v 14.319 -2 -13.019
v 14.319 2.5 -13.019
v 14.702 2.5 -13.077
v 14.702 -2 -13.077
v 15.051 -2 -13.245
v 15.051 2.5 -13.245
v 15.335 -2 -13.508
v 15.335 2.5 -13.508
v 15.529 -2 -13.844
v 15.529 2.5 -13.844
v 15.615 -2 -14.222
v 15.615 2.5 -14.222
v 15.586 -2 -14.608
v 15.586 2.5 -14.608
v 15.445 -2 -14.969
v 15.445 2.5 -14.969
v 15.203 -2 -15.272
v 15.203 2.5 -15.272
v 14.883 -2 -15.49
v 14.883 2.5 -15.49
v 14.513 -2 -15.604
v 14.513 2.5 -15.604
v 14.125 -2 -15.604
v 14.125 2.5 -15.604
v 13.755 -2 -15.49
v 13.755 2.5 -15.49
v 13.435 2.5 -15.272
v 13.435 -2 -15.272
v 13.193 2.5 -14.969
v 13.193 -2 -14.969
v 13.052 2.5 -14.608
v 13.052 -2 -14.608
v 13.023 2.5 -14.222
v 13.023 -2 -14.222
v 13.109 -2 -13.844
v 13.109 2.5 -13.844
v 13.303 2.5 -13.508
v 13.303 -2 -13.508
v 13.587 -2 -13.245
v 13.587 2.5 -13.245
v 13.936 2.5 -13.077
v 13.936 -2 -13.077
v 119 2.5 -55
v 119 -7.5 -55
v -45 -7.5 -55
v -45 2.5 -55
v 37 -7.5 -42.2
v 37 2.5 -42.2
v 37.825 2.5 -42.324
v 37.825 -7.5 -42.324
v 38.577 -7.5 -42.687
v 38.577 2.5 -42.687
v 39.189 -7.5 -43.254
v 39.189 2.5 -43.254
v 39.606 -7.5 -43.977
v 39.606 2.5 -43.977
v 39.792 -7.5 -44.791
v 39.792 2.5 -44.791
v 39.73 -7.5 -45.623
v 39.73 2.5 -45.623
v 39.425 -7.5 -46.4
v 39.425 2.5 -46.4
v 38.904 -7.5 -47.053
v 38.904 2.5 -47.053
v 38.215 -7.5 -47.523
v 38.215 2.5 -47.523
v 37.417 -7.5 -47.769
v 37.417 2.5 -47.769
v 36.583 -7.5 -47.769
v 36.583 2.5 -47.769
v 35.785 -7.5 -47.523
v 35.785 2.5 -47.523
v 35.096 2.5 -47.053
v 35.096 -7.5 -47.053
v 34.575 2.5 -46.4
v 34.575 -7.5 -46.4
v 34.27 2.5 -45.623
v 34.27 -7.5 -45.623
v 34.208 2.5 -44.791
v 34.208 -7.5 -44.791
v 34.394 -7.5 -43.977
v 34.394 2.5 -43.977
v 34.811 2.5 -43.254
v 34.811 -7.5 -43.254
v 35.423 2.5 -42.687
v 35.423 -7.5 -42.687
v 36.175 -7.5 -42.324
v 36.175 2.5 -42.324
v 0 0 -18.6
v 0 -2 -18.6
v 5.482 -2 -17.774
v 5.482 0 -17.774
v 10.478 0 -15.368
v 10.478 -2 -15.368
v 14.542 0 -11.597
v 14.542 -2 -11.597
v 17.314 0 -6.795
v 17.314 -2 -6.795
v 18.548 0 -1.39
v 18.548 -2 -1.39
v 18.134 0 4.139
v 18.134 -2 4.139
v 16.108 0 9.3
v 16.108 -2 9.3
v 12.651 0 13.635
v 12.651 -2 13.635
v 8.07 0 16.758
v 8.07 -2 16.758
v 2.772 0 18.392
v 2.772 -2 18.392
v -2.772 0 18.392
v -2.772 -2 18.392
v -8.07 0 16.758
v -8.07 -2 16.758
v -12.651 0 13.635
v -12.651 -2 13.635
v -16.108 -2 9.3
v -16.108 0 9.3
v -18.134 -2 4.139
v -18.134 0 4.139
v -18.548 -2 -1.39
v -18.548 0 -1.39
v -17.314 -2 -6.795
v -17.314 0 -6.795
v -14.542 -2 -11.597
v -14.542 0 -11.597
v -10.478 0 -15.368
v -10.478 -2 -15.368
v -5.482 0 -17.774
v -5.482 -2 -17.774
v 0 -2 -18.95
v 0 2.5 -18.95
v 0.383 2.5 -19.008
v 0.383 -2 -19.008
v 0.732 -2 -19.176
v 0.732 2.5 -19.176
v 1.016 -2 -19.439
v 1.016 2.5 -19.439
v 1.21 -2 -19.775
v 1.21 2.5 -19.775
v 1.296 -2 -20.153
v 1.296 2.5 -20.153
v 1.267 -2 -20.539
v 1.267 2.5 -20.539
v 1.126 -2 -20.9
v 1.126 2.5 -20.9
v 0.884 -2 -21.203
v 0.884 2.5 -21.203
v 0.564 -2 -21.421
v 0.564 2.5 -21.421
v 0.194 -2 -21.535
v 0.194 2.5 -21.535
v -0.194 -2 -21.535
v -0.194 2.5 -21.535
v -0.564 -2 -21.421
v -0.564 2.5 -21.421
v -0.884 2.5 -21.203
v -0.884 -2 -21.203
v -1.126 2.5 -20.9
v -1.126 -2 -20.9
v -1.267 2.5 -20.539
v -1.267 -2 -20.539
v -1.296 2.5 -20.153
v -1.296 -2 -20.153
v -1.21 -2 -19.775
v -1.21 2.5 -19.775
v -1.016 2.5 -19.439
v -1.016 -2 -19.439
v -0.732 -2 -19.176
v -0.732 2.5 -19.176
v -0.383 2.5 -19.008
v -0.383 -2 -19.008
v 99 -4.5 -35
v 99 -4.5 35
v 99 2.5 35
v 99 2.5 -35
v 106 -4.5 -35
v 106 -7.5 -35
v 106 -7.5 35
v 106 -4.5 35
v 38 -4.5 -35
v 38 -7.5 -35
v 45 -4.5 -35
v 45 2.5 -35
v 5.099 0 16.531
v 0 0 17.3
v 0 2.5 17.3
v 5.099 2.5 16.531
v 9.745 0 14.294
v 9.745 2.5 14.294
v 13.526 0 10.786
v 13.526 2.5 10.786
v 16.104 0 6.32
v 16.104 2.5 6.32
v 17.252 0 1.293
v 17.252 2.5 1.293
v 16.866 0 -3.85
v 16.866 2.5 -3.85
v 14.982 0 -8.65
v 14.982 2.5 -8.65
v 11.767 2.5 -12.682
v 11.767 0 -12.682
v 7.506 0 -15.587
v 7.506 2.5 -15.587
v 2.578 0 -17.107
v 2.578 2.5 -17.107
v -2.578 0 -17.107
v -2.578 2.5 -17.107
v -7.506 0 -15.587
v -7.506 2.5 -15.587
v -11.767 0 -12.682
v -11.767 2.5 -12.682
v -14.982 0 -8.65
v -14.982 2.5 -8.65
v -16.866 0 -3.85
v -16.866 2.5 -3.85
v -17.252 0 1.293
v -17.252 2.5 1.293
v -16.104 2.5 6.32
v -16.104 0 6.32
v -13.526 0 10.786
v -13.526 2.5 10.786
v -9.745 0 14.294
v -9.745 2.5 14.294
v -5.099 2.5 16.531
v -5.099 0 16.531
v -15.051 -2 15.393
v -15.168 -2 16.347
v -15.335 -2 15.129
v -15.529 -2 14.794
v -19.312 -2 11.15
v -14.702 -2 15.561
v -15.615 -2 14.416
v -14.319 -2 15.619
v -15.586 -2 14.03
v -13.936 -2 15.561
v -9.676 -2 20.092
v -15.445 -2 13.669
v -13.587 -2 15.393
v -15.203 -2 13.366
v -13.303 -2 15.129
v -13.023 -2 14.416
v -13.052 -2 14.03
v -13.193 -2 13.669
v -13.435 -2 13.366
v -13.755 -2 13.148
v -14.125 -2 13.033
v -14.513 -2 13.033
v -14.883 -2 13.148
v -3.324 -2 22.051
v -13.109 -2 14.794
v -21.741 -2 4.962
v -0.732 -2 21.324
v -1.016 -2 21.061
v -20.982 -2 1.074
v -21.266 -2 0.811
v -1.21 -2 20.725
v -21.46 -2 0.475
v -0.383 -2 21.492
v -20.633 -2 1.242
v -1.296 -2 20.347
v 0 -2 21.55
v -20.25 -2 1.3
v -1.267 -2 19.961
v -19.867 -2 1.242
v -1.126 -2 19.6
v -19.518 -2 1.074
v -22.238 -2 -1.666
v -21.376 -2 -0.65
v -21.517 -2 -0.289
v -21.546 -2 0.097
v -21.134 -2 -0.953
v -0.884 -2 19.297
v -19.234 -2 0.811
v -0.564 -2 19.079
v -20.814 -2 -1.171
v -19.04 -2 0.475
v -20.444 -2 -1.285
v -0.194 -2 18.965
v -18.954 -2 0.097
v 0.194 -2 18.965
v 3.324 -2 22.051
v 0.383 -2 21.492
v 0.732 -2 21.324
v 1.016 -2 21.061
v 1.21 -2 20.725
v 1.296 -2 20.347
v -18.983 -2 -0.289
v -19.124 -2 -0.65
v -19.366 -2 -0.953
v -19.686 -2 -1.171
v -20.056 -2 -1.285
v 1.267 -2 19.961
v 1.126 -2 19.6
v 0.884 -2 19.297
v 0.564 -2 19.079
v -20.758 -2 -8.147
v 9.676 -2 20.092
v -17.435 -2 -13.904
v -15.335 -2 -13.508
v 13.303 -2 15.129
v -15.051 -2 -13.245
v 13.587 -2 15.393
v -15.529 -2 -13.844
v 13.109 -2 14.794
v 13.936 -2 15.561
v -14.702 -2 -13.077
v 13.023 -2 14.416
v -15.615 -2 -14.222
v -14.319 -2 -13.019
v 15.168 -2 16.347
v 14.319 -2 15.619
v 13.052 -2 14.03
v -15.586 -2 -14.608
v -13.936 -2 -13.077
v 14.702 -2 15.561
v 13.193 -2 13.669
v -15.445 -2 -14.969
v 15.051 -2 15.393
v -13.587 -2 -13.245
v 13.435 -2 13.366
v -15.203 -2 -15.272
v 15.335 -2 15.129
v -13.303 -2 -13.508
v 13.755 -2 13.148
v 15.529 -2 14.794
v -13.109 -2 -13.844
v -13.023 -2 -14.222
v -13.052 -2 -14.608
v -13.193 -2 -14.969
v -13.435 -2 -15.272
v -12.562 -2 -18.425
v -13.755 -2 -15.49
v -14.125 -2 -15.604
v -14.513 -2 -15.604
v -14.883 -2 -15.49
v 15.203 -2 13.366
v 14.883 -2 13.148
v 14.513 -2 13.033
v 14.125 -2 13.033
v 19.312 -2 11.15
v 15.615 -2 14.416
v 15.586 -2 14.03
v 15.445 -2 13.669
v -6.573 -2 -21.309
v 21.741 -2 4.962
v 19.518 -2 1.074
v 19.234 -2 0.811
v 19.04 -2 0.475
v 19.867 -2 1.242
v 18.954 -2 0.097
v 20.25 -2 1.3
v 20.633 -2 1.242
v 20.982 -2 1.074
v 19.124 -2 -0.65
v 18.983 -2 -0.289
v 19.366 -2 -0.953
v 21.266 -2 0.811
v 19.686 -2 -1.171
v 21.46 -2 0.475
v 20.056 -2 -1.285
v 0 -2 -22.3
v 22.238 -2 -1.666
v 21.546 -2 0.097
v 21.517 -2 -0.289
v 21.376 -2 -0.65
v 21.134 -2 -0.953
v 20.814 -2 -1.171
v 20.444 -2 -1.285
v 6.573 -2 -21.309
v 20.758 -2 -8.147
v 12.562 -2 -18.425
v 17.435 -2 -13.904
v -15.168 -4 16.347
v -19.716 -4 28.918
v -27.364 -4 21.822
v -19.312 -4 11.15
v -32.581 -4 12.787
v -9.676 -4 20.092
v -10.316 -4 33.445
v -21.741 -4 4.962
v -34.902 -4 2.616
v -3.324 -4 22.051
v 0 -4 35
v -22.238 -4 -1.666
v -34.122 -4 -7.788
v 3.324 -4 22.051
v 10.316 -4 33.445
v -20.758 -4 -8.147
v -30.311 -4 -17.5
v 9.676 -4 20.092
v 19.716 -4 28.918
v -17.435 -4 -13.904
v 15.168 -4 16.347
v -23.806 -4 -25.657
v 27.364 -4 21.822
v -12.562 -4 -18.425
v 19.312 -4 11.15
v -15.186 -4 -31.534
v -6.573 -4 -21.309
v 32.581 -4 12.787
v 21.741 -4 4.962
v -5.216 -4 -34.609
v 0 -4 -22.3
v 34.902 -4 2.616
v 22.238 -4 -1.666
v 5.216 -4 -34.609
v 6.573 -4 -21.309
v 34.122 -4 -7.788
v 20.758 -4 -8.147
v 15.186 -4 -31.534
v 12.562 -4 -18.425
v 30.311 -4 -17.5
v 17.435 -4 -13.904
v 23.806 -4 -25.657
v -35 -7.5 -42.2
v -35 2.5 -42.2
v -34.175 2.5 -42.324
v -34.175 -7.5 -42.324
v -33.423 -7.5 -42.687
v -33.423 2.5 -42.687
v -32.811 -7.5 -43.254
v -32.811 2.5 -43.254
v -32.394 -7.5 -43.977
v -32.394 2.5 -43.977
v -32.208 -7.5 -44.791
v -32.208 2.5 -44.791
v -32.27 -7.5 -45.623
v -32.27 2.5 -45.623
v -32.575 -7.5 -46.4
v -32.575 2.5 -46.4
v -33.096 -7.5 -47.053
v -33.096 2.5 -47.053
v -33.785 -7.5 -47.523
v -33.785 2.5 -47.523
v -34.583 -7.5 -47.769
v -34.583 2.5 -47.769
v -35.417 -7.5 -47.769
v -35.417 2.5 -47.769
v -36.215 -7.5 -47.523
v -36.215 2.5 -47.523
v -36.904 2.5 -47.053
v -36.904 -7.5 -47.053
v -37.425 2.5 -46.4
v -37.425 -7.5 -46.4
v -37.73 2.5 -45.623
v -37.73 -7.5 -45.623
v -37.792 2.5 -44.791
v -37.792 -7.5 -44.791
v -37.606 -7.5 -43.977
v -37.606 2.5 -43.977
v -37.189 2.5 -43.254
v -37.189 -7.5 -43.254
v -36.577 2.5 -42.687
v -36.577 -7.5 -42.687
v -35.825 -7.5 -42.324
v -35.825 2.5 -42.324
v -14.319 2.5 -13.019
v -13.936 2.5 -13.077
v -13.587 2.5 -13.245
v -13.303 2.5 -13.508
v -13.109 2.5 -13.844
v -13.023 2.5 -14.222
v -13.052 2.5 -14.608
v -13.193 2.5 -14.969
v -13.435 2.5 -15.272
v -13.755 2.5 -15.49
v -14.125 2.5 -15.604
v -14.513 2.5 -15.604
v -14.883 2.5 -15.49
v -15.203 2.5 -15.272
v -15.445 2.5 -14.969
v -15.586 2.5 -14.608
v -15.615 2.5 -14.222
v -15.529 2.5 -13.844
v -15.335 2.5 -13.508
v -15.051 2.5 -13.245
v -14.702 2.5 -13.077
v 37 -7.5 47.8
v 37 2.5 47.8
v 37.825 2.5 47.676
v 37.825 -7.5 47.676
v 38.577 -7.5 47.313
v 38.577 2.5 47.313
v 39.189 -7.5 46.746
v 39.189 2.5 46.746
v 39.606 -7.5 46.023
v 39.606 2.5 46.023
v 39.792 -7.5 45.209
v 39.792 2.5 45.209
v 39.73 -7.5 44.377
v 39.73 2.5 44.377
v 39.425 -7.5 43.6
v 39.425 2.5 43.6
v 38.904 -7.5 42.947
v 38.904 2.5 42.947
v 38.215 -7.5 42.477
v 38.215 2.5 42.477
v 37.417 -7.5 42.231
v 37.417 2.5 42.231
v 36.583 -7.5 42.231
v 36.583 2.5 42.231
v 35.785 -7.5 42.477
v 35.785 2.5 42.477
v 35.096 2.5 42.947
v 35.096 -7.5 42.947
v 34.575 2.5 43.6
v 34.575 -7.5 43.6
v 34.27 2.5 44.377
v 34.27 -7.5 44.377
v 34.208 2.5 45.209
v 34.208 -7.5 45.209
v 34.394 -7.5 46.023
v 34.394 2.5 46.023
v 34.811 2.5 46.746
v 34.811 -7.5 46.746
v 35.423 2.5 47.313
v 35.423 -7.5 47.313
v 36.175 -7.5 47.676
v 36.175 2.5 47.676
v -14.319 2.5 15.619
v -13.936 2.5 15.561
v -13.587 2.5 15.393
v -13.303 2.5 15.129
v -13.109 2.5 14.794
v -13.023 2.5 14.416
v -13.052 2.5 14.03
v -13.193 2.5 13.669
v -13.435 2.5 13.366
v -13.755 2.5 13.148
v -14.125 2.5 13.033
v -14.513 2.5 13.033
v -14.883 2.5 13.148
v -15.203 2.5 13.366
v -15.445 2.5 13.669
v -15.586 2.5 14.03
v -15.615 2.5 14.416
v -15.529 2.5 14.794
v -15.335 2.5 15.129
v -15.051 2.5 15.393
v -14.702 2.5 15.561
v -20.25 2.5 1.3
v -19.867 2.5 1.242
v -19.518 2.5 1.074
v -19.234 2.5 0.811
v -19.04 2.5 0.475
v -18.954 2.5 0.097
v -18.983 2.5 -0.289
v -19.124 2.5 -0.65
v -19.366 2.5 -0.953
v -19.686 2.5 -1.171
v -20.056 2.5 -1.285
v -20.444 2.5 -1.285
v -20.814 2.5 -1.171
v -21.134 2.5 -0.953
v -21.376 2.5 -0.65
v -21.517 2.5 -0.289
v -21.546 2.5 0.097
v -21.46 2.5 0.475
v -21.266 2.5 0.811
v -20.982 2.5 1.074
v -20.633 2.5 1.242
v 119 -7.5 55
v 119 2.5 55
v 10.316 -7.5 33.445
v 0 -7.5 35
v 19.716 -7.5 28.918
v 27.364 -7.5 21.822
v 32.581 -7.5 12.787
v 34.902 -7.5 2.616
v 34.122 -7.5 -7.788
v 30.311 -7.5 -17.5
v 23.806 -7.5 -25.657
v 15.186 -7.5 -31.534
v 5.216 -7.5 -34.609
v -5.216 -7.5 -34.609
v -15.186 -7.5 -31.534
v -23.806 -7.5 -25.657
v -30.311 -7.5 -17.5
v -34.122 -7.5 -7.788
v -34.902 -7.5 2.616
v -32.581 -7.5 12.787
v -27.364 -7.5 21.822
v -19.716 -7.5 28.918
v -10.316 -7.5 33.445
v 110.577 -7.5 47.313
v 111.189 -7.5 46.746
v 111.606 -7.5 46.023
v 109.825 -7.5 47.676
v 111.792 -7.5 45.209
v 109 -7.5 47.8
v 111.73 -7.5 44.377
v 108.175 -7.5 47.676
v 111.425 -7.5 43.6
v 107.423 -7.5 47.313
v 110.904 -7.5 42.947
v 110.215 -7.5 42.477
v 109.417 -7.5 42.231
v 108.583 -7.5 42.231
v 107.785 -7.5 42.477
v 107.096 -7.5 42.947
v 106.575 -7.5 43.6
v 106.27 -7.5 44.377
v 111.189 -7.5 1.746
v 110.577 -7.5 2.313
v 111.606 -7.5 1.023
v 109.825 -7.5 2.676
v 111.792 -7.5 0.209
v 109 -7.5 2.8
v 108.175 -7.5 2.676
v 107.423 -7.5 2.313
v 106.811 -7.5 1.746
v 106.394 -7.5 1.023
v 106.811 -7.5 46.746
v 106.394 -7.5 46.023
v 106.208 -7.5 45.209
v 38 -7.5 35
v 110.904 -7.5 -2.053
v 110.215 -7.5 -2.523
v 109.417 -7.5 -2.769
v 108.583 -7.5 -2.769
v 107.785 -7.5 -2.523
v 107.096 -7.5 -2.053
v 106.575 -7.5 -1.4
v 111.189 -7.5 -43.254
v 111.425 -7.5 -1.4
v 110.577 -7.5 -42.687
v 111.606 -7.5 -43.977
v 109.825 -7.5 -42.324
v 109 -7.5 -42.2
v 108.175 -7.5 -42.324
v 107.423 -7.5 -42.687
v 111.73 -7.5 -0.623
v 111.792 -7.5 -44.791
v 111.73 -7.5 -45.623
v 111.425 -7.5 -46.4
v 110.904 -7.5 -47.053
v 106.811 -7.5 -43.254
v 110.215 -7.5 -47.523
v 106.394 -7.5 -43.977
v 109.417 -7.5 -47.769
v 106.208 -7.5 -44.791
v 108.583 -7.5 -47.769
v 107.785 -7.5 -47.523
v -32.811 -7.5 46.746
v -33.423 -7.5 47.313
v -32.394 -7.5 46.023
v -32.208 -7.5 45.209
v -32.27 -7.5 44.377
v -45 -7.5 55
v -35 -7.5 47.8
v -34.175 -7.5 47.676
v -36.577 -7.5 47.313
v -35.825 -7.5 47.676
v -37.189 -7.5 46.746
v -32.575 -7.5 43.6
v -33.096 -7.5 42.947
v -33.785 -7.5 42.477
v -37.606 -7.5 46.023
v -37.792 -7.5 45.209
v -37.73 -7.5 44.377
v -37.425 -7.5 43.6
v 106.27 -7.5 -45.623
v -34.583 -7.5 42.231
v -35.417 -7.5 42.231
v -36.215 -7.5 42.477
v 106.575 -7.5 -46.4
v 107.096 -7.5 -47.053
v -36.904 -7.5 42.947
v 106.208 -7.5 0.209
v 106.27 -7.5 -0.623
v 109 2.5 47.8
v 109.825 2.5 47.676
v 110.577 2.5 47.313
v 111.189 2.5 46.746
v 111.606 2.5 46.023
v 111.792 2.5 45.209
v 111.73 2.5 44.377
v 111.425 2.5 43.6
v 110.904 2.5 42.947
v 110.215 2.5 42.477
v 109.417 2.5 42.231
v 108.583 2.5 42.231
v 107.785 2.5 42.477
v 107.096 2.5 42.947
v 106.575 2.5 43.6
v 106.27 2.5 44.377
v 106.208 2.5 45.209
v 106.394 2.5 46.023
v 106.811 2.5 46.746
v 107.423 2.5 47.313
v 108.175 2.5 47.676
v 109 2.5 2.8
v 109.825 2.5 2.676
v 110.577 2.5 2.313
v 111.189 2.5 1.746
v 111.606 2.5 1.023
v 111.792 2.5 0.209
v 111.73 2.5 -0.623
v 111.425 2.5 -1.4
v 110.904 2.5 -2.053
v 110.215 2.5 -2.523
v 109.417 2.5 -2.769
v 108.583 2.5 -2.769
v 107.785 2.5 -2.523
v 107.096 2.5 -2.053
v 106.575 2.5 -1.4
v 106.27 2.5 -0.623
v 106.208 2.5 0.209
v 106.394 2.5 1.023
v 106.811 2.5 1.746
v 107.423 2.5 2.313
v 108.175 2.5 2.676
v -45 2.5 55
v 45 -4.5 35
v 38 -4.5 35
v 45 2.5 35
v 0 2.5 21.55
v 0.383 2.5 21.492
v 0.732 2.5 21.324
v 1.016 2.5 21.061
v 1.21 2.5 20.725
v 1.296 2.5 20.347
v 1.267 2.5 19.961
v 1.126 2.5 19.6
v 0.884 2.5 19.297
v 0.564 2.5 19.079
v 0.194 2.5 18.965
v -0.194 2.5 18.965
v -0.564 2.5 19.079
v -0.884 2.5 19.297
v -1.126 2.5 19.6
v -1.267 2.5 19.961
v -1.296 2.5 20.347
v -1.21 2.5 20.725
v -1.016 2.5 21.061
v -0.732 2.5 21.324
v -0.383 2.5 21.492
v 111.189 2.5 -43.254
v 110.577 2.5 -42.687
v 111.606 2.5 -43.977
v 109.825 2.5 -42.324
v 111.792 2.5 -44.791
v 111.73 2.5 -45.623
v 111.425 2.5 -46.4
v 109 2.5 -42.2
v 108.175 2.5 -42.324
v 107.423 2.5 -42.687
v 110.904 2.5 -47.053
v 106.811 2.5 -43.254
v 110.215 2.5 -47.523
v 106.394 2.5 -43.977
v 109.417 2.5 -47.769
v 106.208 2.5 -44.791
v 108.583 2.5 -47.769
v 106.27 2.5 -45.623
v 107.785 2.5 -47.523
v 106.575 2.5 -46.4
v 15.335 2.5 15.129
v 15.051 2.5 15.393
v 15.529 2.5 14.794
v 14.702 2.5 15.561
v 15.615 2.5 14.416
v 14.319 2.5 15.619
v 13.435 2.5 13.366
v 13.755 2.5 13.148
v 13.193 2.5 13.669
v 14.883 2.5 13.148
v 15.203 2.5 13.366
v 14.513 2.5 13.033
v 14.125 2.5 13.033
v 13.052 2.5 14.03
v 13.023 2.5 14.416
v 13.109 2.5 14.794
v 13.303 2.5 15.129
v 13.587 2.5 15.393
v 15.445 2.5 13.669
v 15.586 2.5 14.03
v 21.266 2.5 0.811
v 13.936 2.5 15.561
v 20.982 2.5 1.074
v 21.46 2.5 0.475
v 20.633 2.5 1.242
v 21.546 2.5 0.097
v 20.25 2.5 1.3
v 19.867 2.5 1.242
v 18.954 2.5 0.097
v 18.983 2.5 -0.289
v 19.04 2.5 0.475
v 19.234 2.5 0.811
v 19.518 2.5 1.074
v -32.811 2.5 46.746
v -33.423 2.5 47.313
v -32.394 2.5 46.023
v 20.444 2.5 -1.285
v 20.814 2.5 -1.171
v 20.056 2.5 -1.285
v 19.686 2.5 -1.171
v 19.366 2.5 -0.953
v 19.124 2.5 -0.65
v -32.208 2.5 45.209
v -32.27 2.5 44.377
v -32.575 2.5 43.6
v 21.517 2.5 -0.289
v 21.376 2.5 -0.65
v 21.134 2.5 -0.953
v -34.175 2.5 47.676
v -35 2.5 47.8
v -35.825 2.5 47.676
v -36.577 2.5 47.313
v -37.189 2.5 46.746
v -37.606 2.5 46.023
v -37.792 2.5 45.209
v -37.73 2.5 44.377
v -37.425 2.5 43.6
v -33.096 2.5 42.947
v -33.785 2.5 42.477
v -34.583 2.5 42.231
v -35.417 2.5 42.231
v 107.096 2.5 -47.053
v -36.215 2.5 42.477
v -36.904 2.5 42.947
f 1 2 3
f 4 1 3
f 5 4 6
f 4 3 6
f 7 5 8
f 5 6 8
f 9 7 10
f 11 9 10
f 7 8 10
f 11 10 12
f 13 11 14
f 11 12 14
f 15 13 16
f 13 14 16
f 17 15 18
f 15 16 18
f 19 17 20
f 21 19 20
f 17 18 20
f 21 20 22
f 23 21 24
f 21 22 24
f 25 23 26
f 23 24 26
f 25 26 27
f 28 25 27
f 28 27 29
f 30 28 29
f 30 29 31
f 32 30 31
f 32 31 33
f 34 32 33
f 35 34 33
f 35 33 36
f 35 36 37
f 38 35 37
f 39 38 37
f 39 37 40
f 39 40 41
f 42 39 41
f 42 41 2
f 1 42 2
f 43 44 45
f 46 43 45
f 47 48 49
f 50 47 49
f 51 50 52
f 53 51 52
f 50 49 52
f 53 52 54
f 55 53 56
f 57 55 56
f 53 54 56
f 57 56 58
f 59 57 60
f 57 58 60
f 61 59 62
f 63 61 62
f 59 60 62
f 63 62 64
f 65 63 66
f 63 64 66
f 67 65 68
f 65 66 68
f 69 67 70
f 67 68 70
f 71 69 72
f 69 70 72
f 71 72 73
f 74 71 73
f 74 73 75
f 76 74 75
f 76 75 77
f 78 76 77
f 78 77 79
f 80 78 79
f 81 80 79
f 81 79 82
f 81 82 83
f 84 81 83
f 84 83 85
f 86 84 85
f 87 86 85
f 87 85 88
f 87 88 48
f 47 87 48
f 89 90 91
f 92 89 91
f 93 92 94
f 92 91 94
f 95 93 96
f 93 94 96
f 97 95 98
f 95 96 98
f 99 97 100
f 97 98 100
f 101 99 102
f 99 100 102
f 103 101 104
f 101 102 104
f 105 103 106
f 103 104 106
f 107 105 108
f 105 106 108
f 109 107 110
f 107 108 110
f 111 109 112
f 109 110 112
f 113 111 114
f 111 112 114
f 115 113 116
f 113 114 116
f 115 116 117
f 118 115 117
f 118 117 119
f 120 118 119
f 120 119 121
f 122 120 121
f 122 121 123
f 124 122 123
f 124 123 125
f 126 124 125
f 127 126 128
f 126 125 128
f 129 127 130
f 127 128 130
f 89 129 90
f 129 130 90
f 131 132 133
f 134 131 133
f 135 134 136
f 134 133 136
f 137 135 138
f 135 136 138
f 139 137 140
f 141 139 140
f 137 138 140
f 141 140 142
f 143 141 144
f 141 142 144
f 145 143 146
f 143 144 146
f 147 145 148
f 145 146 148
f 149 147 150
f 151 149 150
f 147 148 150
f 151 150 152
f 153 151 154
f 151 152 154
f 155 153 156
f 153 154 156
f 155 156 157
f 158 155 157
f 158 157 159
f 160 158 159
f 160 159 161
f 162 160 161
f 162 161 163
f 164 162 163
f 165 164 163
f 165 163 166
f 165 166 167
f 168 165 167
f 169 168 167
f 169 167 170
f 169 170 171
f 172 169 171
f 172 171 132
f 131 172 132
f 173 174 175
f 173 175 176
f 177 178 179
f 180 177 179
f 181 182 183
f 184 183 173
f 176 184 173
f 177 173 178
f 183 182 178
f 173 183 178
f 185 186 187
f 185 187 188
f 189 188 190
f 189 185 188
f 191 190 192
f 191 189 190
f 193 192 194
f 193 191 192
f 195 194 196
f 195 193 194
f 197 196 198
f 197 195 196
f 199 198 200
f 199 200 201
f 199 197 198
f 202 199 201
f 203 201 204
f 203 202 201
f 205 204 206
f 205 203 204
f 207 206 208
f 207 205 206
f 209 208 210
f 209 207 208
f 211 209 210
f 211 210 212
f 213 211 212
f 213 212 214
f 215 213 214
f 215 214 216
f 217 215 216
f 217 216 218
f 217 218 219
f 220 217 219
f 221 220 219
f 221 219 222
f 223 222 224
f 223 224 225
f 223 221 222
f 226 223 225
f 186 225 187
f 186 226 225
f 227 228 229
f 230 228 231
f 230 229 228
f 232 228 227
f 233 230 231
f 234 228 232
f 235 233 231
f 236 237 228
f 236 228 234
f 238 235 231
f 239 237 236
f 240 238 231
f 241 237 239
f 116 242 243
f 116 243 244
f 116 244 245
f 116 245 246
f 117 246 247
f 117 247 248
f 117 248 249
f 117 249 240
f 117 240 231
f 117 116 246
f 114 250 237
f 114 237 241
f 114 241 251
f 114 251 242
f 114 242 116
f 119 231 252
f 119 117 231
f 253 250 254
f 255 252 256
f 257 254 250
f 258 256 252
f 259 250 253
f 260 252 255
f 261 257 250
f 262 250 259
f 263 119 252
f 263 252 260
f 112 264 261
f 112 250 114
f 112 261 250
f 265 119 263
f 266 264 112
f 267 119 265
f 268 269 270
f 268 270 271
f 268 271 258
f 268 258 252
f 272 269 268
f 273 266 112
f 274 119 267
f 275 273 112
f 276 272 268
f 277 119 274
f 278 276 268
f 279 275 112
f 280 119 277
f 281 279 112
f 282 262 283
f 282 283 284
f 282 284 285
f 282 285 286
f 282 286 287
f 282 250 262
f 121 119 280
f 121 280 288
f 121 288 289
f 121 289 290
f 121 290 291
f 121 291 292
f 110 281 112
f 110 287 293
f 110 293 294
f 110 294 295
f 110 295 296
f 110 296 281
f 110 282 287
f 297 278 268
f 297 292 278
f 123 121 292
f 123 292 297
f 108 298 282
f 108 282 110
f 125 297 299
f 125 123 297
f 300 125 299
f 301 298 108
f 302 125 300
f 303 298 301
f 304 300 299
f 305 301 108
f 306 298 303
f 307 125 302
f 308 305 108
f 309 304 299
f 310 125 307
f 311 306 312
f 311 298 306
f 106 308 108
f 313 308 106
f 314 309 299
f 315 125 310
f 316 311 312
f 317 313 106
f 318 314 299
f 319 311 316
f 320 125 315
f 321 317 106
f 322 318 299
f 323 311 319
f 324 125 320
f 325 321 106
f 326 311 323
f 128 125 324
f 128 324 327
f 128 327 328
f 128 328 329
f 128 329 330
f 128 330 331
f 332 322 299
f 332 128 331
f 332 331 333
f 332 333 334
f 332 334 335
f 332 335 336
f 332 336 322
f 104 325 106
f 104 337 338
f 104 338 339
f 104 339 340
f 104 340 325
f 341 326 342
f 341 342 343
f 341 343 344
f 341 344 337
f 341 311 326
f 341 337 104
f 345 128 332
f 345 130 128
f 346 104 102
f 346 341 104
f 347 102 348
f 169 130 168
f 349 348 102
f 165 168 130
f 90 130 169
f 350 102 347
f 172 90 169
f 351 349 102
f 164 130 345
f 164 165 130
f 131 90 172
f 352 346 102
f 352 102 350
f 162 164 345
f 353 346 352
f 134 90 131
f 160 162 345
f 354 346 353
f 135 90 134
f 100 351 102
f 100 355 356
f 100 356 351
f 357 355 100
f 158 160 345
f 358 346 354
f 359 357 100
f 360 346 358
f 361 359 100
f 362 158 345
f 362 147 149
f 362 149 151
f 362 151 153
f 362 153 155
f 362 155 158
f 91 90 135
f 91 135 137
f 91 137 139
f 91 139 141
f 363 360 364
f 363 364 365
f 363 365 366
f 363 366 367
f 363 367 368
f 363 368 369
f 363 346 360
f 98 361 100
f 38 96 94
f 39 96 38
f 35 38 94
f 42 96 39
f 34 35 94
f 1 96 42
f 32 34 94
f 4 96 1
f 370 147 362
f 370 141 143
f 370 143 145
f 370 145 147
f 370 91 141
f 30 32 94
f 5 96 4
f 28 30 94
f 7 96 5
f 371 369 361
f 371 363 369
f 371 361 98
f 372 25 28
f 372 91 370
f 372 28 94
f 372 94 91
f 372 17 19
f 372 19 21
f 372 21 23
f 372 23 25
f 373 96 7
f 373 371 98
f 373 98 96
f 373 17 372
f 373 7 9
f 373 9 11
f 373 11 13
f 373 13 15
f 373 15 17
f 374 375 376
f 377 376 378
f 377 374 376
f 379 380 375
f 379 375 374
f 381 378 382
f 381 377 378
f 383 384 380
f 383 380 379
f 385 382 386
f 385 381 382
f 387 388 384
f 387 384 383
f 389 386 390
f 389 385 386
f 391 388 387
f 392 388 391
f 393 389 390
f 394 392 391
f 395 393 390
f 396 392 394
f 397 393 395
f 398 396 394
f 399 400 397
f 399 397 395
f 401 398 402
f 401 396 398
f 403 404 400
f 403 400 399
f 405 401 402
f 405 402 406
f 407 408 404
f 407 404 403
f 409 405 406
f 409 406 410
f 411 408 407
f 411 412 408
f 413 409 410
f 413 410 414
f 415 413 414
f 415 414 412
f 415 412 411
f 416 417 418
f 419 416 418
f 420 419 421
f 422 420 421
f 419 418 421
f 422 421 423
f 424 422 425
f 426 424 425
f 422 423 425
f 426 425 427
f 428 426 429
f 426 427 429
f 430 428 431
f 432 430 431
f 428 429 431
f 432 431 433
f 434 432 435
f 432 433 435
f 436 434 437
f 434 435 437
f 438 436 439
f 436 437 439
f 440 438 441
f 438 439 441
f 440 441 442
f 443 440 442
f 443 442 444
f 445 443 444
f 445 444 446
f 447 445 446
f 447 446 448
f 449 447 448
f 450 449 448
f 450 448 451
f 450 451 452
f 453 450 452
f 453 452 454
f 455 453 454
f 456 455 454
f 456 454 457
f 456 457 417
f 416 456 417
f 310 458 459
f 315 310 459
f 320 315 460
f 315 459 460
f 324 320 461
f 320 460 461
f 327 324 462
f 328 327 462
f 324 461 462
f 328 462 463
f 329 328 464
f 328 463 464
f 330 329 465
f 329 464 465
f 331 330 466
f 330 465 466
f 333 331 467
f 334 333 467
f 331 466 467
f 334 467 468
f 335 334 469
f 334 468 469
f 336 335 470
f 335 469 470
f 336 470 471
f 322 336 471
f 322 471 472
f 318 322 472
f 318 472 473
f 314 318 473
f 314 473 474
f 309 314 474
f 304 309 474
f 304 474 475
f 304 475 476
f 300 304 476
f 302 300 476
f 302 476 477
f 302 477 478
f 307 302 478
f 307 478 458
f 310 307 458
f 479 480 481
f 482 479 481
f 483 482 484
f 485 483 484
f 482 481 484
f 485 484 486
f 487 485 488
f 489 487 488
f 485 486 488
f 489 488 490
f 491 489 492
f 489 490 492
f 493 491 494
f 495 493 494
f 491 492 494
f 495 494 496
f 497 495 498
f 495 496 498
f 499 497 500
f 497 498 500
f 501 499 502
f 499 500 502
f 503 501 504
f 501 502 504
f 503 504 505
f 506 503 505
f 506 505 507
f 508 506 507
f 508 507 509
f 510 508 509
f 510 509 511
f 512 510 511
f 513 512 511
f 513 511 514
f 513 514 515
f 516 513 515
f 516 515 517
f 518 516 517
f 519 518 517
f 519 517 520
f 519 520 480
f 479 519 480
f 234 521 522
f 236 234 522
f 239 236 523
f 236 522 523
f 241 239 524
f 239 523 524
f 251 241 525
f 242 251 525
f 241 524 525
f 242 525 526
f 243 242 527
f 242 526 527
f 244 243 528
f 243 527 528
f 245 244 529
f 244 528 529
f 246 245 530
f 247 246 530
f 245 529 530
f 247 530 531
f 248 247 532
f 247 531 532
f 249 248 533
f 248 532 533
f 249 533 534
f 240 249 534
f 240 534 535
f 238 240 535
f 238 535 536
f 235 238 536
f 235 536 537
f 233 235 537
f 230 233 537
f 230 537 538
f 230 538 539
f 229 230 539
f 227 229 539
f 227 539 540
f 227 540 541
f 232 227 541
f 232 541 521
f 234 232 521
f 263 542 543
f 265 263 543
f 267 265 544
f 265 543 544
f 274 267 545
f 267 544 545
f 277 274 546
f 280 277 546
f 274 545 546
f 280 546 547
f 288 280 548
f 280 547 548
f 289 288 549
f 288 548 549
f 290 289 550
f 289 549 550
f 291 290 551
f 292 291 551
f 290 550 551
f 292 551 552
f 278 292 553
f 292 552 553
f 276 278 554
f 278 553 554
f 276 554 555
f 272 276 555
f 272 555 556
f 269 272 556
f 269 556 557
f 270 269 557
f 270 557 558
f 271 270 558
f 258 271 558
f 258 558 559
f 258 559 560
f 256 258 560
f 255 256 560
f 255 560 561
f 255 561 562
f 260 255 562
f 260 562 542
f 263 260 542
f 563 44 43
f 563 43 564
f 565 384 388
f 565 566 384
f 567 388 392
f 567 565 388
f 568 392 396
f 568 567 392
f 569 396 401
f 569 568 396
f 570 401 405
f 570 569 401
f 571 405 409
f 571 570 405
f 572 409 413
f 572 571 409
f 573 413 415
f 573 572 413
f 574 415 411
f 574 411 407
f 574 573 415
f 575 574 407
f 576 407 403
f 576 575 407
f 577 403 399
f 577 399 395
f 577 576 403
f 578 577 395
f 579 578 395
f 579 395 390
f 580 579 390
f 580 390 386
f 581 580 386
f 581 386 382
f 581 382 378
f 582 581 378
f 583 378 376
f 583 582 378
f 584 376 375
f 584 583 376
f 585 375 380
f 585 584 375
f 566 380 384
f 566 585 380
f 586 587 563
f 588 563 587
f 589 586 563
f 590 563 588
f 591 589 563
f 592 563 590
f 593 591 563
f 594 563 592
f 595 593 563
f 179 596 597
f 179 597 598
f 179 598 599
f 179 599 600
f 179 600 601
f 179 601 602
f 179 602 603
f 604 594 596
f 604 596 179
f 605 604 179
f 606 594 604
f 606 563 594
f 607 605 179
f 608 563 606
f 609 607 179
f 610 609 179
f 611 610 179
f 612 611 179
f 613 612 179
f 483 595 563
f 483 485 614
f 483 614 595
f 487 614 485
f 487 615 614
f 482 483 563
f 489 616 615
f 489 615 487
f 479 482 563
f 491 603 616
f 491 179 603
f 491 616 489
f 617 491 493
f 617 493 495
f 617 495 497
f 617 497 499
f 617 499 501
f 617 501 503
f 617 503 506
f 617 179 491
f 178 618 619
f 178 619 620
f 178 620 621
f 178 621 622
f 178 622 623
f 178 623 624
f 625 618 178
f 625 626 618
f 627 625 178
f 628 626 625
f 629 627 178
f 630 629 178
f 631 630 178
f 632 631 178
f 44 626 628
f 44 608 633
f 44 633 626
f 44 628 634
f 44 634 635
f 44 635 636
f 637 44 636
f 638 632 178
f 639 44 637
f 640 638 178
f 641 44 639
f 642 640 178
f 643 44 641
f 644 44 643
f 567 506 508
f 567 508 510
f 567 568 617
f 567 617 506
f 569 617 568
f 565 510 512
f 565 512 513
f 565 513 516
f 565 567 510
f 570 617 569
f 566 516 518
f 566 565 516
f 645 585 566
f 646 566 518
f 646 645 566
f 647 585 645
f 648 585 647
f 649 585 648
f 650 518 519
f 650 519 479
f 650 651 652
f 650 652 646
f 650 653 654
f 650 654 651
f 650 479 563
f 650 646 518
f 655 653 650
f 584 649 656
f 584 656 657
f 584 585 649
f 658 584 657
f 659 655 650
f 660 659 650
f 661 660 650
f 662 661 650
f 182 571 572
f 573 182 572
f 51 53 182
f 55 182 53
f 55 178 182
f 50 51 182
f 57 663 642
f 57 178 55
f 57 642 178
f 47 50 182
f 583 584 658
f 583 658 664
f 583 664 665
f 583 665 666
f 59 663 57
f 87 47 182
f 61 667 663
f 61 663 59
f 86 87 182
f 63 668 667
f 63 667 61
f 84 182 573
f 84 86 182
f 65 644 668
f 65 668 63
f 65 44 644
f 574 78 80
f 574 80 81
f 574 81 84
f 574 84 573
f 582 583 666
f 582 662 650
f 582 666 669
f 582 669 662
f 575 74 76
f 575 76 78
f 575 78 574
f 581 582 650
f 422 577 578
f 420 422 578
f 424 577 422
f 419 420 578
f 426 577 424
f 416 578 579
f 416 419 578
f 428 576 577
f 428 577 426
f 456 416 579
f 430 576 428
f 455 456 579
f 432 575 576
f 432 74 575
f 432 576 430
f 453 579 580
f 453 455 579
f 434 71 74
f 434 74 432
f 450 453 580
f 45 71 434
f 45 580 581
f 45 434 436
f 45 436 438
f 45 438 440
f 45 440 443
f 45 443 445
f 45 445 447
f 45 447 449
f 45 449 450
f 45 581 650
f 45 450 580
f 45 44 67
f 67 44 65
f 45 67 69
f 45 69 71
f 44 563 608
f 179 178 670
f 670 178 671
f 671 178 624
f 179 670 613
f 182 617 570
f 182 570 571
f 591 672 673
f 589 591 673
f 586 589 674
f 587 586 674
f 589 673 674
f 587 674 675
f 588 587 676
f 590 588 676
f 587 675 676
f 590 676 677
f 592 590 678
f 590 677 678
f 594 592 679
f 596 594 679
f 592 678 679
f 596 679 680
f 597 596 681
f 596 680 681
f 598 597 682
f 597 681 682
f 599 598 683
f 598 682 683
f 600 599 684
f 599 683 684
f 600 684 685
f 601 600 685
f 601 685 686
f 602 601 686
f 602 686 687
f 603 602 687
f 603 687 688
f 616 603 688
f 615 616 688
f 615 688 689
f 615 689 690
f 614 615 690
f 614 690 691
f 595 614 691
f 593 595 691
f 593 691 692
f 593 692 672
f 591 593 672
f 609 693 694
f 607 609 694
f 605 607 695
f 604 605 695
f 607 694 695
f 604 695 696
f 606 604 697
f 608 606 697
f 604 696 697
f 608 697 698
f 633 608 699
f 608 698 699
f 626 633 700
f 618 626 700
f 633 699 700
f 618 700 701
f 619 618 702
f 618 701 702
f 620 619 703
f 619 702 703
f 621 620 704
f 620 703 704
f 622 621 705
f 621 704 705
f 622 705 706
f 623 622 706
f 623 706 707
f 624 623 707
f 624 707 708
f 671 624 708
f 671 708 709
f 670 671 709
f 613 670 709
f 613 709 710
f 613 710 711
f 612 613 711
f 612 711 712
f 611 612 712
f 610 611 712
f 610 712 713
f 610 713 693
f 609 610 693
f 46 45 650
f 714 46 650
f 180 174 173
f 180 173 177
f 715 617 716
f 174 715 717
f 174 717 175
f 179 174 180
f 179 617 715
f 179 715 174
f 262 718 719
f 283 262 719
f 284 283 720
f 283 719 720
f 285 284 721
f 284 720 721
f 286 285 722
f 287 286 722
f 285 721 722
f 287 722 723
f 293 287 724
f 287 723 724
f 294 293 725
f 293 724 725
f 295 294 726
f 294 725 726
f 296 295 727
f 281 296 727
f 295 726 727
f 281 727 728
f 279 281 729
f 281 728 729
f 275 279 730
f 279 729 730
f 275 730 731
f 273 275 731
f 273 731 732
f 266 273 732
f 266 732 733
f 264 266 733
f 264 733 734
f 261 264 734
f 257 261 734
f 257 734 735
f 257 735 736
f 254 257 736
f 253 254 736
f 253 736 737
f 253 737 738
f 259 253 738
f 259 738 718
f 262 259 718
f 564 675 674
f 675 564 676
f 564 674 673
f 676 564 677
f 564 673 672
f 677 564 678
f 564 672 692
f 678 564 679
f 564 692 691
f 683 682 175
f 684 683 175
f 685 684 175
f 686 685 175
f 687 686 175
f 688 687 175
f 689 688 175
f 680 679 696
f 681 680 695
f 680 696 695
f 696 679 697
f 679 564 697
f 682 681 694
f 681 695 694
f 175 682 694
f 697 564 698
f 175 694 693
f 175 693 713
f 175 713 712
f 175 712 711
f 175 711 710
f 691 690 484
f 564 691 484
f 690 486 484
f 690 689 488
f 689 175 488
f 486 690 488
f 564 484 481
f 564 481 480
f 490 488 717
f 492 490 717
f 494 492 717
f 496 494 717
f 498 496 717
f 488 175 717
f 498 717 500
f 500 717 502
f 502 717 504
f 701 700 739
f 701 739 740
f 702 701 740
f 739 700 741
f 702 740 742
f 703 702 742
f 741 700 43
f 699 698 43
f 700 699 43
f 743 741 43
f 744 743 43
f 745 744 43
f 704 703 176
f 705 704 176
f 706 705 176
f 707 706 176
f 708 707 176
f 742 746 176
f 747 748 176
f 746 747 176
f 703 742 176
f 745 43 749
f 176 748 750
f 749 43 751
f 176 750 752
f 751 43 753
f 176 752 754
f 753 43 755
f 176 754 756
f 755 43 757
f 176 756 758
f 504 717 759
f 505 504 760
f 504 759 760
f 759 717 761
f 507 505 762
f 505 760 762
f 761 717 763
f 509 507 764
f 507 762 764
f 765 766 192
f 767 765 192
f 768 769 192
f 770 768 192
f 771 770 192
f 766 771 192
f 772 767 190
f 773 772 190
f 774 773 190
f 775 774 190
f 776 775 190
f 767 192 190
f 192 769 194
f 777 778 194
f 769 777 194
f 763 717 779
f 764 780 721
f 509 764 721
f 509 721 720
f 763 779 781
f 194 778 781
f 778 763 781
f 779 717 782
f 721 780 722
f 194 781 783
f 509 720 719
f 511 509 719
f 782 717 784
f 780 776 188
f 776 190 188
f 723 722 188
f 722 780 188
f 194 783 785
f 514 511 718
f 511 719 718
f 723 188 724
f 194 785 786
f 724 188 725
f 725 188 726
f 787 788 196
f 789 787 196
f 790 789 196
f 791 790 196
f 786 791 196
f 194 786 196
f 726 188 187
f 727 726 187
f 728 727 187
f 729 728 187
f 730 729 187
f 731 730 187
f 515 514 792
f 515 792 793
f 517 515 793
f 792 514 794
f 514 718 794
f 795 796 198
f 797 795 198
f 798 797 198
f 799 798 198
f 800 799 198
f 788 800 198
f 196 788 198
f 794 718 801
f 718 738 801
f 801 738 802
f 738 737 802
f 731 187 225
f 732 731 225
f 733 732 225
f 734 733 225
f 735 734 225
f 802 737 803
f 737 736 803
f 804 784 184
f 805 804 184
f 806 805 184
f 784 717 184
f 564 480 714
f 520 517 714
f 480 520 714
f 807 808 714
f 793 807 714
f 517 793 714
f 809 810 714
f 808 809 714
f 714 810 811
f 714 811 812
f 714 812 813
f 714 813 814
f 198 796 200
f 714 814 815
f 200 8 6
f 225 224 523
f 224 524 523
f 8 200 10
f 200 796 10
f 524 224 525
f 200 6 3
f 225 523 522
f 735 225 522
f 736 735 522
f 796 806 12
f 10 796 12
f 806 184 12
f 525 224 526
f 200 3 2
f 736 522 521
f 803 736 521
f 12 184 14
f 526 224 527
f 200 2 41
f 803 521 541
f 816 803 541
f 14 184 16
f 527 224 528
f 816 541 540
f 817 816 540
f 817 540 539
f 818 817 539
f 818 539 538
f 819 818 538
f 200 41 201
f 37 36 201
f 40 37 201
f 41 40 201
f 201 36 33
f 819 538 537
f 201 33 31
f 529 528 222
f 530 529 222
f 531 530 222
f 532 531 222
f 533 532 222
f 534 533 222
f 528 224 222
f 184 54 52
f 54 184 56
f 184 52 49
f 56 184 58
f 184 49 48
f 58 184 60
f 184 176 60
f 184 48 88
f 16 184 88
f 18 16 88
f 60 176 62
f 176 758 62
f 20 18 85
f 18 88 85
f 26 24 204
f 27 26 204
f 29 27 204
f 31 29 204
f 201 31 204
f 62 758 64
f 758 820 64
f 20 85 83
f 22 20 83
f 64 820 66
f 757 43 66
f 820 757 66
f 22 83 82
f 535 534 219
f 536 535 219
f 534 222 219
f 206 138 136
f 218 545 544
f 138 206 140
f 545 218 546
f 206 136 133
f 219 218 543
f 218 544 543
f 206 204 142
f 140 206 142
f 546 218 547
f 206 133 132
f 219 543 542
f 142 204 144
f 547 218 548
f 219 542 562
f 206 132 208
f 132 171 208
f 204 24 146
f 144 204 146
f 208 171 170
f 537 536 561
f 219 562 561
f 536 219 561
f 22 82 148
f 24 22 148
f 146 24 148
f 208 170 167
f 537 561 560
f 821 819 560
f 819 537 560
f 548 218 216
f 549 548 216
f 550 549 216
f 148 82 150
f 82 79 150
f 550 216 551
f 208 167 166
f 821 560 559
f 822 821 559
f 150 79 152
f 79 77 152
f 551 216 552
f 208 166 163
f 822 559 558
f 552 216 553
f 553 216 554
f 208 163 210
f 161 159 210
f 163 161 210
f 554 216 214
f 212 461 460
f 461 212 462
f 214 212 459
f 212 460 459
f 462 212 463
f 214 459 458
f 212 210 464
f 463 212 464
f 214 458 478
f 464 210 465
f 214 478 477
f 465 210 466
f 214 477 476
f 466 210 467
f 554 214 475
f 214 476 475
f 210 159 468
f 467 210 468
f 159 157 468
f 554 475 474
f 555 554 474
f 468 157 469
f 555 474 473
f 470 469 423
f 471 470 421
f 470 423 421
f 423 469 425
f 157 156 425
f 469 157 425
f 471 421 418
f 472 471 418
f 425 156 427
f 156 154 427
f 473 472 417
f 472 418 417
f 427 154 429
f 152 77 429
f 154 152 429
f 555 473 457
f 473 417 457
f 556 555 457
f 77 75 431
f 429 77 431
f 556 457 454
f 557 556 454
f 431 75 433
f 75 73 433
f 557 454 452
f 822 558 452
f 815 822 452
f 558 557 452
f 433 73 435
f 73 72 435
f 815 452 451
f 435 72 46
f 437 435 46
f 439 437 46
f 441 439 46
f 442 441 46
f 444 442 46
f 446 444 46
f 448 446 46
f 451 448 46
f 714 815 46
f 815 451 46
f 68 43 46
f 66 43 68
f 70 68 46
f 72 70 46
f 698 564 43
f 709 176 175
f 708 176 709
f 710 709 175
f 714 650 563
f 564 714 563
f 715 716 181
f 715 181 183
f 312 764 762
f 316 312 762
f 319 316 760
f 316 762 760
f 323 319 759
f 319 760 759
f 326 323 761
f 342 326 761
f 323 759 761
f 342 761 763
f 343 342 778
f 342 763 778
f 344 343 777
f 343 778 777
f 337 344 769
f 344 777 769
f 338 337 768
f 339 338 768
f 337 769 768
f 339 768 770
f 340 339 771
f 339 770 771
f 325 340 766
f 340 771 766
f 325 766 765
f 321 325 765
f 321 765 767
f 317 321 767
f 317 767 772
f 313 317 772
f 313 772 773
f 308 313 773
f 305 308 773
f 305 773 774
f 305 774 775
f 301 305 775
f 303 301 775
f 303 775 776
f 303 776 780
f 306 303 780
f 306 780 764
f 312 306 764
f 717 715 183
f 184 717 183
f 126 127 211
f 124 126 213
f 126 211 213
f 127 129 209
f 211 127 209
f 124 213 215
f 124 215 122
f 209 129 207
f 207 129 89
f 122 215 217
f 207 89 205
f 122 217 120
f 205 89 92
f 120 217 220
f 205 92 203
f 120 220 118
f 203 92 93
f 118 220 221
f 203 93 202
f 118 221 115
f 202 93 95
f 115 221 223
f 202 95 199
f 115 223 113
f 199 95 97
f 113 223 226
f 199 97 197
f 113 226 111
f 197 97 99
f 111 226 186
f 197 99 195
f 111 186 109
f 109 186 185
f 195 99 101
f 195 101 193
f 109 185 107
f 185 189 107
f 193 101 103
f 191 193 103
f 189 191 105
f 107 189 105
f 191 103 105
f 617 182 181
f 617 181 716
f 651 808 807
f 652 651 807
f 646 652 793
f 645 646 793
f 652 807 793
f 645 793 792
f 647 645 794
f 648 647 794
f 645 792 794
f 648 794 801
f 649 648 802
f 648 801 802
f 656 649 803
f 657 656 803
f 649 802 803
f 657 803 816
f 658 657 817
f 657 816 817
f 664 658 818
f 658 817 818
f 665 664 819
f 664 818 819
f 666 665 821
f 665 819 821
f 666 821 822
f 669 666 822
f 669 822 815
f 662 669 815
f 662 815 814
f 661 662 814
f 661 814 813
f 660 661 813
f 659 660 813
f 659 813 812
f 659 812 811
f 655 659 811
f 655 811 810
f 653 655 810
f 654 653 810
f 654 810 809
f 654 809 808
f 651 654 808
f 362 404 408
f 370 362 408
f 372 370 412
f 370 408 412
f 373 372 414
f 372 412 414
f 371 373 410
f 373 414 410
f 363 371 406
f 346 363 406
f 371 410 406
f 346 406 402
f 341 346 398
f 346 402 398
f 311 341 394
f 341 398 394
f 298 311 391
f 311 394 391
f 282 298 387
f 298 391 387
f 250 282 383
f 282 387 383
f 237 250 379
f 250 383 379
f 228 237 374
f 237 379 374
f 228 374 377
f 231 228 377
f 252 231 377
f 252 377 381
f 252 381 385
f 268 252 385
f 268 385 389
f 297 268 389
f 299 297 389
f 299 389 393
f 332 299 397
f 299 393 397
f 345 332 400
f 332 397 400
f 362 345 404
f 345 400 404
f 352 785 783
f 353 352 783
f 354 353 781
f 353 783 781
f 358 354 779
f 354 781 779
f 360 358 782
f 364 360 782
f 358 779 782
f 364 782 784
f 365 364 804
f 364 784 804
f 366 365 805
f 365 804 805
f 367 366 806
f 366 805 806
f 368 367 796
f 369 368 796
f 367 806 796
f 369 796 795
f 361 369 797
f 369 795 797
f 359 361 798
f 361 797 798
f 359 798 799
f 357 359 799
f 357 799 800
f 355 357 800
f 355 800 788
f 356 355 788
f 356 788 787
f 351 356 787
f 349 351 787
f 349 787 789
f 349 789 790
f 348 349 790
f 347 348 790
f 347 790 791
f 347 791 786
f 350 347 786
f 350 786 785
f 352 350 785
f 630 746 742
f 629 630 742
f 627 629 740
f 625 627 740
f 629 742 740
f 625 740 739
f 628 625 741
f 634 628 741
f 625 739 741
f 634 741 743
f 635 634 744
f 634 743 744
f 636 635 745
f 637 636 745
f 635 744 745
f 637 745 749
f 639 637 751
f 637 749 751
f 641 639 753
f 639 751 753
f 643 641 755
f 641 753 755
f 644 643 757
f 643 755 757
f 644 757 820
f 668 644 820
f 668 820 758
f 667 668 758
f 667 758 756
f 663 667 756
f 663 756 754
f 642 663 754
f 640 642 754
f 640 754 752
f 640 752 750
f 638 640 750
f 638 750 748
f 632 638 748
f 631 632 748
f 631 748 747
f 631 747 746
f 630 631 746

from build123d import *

# Parameters (mm, degrees)
SKETCH1_R           = 35
SKETCH1_R_2         = 17.3
BOSS_EXTRUDE1_DEPTH = 2.5
BOSS_EXTRUDE2_START = 2
SKETCH3_R           = 35
SKETCH3_R_2         = 18.6
BOSS_EXTRUDE2_DEPTH = 2
BOSS_EXTRUDE3_START = 2
SKETCH4_R           = 35
SKETCH4_R_2         = 22.3
BOSS_EXTRUDE3_DEPTH = 2
CUT_EXTRUDE1_REACH  = 51.922
SKETCH6_R           = 1.3
BOSS_EXTRUDE6_START = -10
SKETCH7_R           = 35
SKETCH7_W           = 54
SKETCH7_H           = 70
BOSS_EXTRUDE6_DEPTH = 10
SKETCH8_W           = 7
SKETCH8_H           = 70
CUT_EXTRUDE3_DEPTH  = 3
CUT_EXTRUDE4_REACH  = 133.476
SKETCH10_R          = 2.8


with BuildPart() as part:
    # Sketch1 → Boss-Extrude1 (new body)
    with BuildSketch(Plane(origin=(0, 0, 0), x_dir=(1, 0, 0), z_dir=(0, 1, 0))):
        with Locations(Location((0, 0, 0), (0, 0, 270))):
            Circle(SKETCH1_R)
        with Locations(Location((0, 0, 0), (0, 0, 270))):
            Circle(SKETCH1_R_2, mode=Mode.SUBTRACT)
    extrude(amount=BOSS_EXTRUDE1_DEPTH)

    # Sketch3 → Boss-Extrude2 (add)
    with BuildSketch(Plane.XZ.offset(BOSS_EXTRUDE2_START)):
        with Locations(Location((0, 0, 0), (0, 0, 270))):
            Circle(SKETCH3_R)
        with Locations(Location((0, 0, 0), (0, 0, 270))):
            Circle(SKETCH3_R_2, mode=Mode.SUBTRACT)
    extrude(amount=-BOSS_EXTRUDE2_DEPTH)

    # Sketch4 → Boss-Extrude3 (add)
    with BuildSketch(Plane.XZ.offset(2).offset(BOSS_EXTRUDE3_START)):
        with Locations(Location((0, 0, 0), (0, 0, 270))):
            Circle(SKETCH4_R)
        with Locations(Location((0, 0, 0), (0, 0, 270))):
            Circle(SKETCH4_R_2, mode=Mode.SUBTRACT)
    extrude(amount=-BOSS_EXTRUDE3_DEPTH)

    # Sketch6 → Cut-Extrude1 (cut, up to next)
    with BuildSketch(Plane(origin=(0, 2.5, 0), x_dir=(1, 0, 0), z_dir=(0, 1, 0)), mode=Mode.PRIVATE) as cut_extrude1_sk1:
        with Locations(Location((0, 20.25, 0), (0, 0, 270))):
            Circle(SKETCH6_R)
    cut_extrude1_tool1 = extrude(cut_extrude1_sk1.sketch, amount=-CUT_EXTRUDE1_REACH, mode=Mode.PRIVATE) & part.part
    # Sketch6 → Cut-Extrude1 (cut, up to next)
    with BuildSketch(Plane(origin=(0, 2.5, 0), x_dir=(1, 0, 0), z_dir=(0, 1, 0)), mode=Mode.PRIVATE) as cut_extrude1_sk2:
        with Locations(Location((14.318912319, 14.318912319, 0), (0, 0, 270))):
            Circle(SKETCH6_R)
    cut_extrude1_tool2 = extrude(cut_extrude1_sk2.sketch, amount=-CUT_EXTRUDE1_REACH, mode=Mode.PRIVATE) & part.part
    # Sketch6 → Cut-Extrude1 (cut, up to next)
    with BuildSketch(Plane(origin=(0, 2.5, 0), x_dir=(1, 0, 0), z_dir=(0, 1, 0)), mode=Mode.PRIVATE) as cut_extrude1_sk3:
        with Locations(Location((20.25, 0, 0), (0, 0, 270))):
            Circle(SKETCH6_R)
    cut_extrude1_tool3 = extrude(cut_extrude1_sk3.sketch, amount=-CUT_EXTRUDE1_REACH, mode=Mode.PRIVATE) & part.part
    # Sketch6 → Cut-Extrude1 (cut, up to next)
    with BuildSketch(Plane(origin=(0, 2.5, 0), x_dir=(1, 0, 0), z_dir=(0, 1, 0)), mode=Mode.PRIVATE) as cut_extrude1_sk4:
        with Locations(Location((14.318912319, -14.318912319, 0), (0, 0, 270))):
            Circle(SKETCH6_R)
    cut_extrude1_tool4 = extrude(cut_extrude1_sk4.sketch, amount=-CUT_EXTRUDE1_REACH, mode=Mode.PRIVATE) & part.part
    # Sketch6 → Cut-Extrude1 (cut, up to next)
    with BuildSketch(Plane(origin=(0, 2.5, 0), x_dir=(1, 0, 0), z_dir=(0, 1, 0)), mode=Mode.PRIVATE) as cut_extrude1_sk5:
        with Locations(Location((0, -20.25, 0), (0, 0, 270))):
            Circle(SKETCH6_R)
    cut_extrude1_tool5 = extrude(cut_extrude1_sk5.sketch, amount=-CUT_EXTRUDE1_REACH, mode=Mode.PRIVATE) & part.part
    # Sketch6 → Cut-Extrude1 (cut, up to next)
    with BuildSketch(Plane(origin=(0, 2.5, 0), x_dir=(1, 0, 0), z_dir=(0, 1, 0)), mode=Mode.PRIVATE) as cut_extrude1_sk6:
        with Locations(Location((-14.318912319, -14.318912319, 0), (0, 0, 270))):
            Circle(SKETCH6_R)
    cut_extrude1_tool6 = extrude(cut_extrude1_sk6.sketch, amount=-CUT_EXTRUDE1_REACH, mode=Mode.PRIVATE) & part.part
    # Sketch6 → Cut-Extrude1 (cut, up to next)
    with BuildSketch(Plane(origin=(0, 2.5, 0), x_dir=(1, 0, 0), z_dir=(0, 1, 0)), mode=Mode.PRIVATE) as cut_extrude1_sk7:
        with Locations(Location((-20.25, 0, 0), (0, 0, 270))):
            Circle(SKETCH6_R)
    cut_extrude1_tool7 = extrude(cut_extrude1_sk7.sketch, amount=-CUT_EXTRUDE1_REACH, mode=Mode.PRIVATE) & part.part
    # Sketch6 → Cut-Extrude1 (cut, up to next)
    with BuildSketch(Plane(origin=(0, 2.5, 0), x_dir=(1, 0, 0), z_dir=(0, 1, 0)), mode=Mode.PRIVATE) as cut_extrude1_sk8:
        with Locations(Location((-14.318912319, 14.318912319, 0), (0, 0, 270))):
            Circle(SKETCH6_R)
    cut_extrude1_tool8 = extrude(cut_extrude1_sk8.sketch, amount=-CUT_EXTRUDE1_REACH, mode=Mode.PRIVATE) & part.part
    add(cut_extrude1_tool1.solids().sort_by_distance((0, 2.5, -20.25))[0], mode=Mode.SUBTRACT)
    add(cut_extrude1_tool2.solids().sort_by_distance((14.318912, 2.5, -14.318912))[0], mode=Mode.SUBTRACT)
    add(cut_extrude1_tool3.solids().sort_by_distance((20.25, 2.5, 0))[0], mode=Mode.SUBTRACT)
    add(cut_extrude1_tool4.solids().sort_by_distance((14.318912, 2.5, 14.318912))[0], mode=Mode.SUBTRACT)
    add(cut_extrude1_tool5.solids().sort_by_distance((0, 2.5, 20.25))[0], mode=Mode.SUBTRACT)
    add(cut_extrude1_tool6.solids().sort_by_distance((-14.318912, 2.5, 14.318912))[0], mode=Mode.SUBTRACT)
    add(cut_extrude1_tool7.solids().sort_by_distance((-20.25, 2.5, 0))[0], mode=Mode.SUBTRACT)
    add(cut_extrude1_tool8.solids().sort_by_distance((-14.318912, 2.5, -14.318912))[0], mode=Mode.SUBTRACT)

    # Sketch7 → Boss-Extrude6 (add)
    with BuildSketch(Plane(origin=(0, 2.5, 0), x_dir=(1, 0, 0), z_dir=(0, 1, 0)).offset(BOSS_EXTRUDE6_START)):
        Polygon((-45, 55), (99, 55), (119, 55), (119, -55), (99, -55), (-35, -55), (-45, -55), (-45, 35), align=None)
        with Locations(Location((0, 0, 0), (0, 0, 270))):
            Circle(SKETCH7_R, mode=Mode.SUBTRACT)
        with Locations((72, 0)):
            Rectangle(SKETCH7_W, SKETCH7_H, mode=Mode.SUBTRACT)
    extrude(amount=BOSS_EXTRUDE6_DEPTH)

    # Sketch8 → Cut-Extrude3 (cut)
    with BuildSketch(Plane.XZ.offset(7.5)):
        with Locations((102.5, 0)):
            Rectangle(SKETCH8_W, SKETCH8_H)
        with Locations((41.5, 0)):
            Rectangle(SKETCH8_W, SKETCH8_H)
    extrude(amount=-CUT_EXTRUDE3_DEPTH, mode=Mode.SUBTRACT)

    # Sketch10 → Cut-Extrude4 (cut, up to next)
    with BuildSketch(Plane(origin=(0, 2.5, 0), x_dir=(1, 0, 0), z_dir=(0, 1, 0)), mode=Mode.PRIVATE) as cut_extrude4_sk1:
        with Locations(Location((37, 45, 0), (0, 0, 270))):
            Circle(SKETCH10_R)
    cut_extrude4_tool1 = extrude(cut_extrude4_sk1.sketch, amount=-CUT_EXTRUDE4_REACH, mode=Mode.PRIVATE) & part.part
    # Sketch10 → Cut-Extrude4 (cut, up to next)
    with BuildSketch(Plane(origin=(0, 2.5, 0), x_dir=(1, 0, 0), z_dir=(0, 1, 0)), mode=Mode.PRIVATE) as cut_extrude4_sk2:
        with Locations(Location((-35, 45, 0), (0, 0, 270))):
            Circle(SKETCH10_R)
    cut_extrude4_tool2 = extrude(cut_extrude4_sk2.sketch, amount=-CUT_EXTRUDE4_REACH, mode=Mode.PRIVATE) & part.part
    # Sketch10 → Cut-Extrude4 (cut, up to next)
    with BuildSketch(Plane(origin=(0, 2.5, 0), x_dir=(1, 0, 0), z_dir=(0, 1, 0)), mode=Mode.PRIVATE) as cut_extrude4_sk3:
        with Locations(Location((-35, -45, 0), (0, 0, 270))):
            Circle(SKETCH10_R)
    cut_extrude4_tool3 = extrude(cut_extrude4_sk3.sketch, amount=-CUT_EXTRUDE4_REACH, mode=Mode.PRIVATE) & part.part
    # Sketch10 → Cut-Extrude4 (cut, up to next)
    with BuildSketch(Plane(origin=(0, 2.5, 0), x_dir=(1, 0, 0), z_dir=(0, 1, 0)), mode=Mode.PRIVATE) as cut_extrude4_sk4:
        with Locations(Location((37, -45, 0), (0, 0, 270))):
            Circle(SKETCH10_R)
    cut_extrude4_tool4 = extrude(cut_extrude4_sk4.sketch, amount=-CUT_EXTRUDE4_REACH, mode=Mode.PRIVATE) & part.part
    # Sketch10 → Cut-Extrude4 (cut, up to next)
    with BuildSketch(Plane(origin=(0, 2.5, 0), x_dir=(1, 0, 0), z_dir=(0, 1, 0)), mode=Mode.PRIVATE) as cut_extrude4_sk5:
        with Locations(Location((109, 45, 0), (0, 0, 270))):
            Circle(SKETCH10_R)
    cut_extrude4_tool5 = extrude(cut_extrude4_sk5.sketch, amount=-CUT_EXTRUDE4_REACH, mode=Mode.PRIVATE) & part.part
    # Sketch10 → Cut-Extrude4 (cut, up to next)
    with BuildSketch(Plane(origin=(0, 2.5, 0), x_dir=(1, 0, 0), z_dir=(0, 1, 0)), mode=Mode.PRIVATE) as cut_extrude4_sk6:
        with Locations(Location((109, -45, 0), (0, 0, 270))):
            Circle(SKETCH10_R)
    cut_extrude4_tool6 = extrude(cut_extrude4_sk6.sketch, amount=-CUT_EXTRUDE4_REACH, mode=Mode.PRIVATE) & part.part
    # Sketch10 → Cut-Extrude4 (cut, up to next)
    with BuildSketch(Plane(origin=(0, 2.5, 0), x_dir=(1, 0, 0), z_dir=(0, 1, 0)), mode=Mode.PRIVATE) as cut_extrude4_sk7:
        with Locations(Location((109, 0, 0), (0, 0, 270))):
            Circle(SKETCH10_R)
    cut_extrude4_tool7 = extrude(cut_extrude4_sk7.sketch, amount=-CUT_EXTRUDE4_REACH, mode=Mode.PRIVATE) & part.part
    add(cut_extrude4_tool1.solids().sort_by_distance((37, 2.5, -45))[0], mode=Mode.SUBTRACT)
    add(cut_extrude4_tool2.solids().sort_by_distance((-35, 2.5, -45))[0], mode=Mode.SUBTRACT)
    add(cut_extrude4_tool3.solids().sort_by_distance((-35, 2.5, 45))[0], mode=Mode.SUBTRACT)
    add(cut_extrude4_tool4.solids().sort_by_distance((37, 2.5, 45))[0], mode=Mode.SUBTRACT)
    add(cut_extrude4_tool5.solids().sort_by_distance((109, 2.5, -45))[0], mode=Mode.SUBTRACT)
    add(cut_extrude4_tool6.solids().sort_by_distance((109, 2.5, 45))[0], mode=Mode.SUBTRACT)
    add(cut_extrude4_tool7.solids().sort_by_distance((109, 2.5, 0))[0], mode=Mode.SUBTRACT)


solid = part.part
